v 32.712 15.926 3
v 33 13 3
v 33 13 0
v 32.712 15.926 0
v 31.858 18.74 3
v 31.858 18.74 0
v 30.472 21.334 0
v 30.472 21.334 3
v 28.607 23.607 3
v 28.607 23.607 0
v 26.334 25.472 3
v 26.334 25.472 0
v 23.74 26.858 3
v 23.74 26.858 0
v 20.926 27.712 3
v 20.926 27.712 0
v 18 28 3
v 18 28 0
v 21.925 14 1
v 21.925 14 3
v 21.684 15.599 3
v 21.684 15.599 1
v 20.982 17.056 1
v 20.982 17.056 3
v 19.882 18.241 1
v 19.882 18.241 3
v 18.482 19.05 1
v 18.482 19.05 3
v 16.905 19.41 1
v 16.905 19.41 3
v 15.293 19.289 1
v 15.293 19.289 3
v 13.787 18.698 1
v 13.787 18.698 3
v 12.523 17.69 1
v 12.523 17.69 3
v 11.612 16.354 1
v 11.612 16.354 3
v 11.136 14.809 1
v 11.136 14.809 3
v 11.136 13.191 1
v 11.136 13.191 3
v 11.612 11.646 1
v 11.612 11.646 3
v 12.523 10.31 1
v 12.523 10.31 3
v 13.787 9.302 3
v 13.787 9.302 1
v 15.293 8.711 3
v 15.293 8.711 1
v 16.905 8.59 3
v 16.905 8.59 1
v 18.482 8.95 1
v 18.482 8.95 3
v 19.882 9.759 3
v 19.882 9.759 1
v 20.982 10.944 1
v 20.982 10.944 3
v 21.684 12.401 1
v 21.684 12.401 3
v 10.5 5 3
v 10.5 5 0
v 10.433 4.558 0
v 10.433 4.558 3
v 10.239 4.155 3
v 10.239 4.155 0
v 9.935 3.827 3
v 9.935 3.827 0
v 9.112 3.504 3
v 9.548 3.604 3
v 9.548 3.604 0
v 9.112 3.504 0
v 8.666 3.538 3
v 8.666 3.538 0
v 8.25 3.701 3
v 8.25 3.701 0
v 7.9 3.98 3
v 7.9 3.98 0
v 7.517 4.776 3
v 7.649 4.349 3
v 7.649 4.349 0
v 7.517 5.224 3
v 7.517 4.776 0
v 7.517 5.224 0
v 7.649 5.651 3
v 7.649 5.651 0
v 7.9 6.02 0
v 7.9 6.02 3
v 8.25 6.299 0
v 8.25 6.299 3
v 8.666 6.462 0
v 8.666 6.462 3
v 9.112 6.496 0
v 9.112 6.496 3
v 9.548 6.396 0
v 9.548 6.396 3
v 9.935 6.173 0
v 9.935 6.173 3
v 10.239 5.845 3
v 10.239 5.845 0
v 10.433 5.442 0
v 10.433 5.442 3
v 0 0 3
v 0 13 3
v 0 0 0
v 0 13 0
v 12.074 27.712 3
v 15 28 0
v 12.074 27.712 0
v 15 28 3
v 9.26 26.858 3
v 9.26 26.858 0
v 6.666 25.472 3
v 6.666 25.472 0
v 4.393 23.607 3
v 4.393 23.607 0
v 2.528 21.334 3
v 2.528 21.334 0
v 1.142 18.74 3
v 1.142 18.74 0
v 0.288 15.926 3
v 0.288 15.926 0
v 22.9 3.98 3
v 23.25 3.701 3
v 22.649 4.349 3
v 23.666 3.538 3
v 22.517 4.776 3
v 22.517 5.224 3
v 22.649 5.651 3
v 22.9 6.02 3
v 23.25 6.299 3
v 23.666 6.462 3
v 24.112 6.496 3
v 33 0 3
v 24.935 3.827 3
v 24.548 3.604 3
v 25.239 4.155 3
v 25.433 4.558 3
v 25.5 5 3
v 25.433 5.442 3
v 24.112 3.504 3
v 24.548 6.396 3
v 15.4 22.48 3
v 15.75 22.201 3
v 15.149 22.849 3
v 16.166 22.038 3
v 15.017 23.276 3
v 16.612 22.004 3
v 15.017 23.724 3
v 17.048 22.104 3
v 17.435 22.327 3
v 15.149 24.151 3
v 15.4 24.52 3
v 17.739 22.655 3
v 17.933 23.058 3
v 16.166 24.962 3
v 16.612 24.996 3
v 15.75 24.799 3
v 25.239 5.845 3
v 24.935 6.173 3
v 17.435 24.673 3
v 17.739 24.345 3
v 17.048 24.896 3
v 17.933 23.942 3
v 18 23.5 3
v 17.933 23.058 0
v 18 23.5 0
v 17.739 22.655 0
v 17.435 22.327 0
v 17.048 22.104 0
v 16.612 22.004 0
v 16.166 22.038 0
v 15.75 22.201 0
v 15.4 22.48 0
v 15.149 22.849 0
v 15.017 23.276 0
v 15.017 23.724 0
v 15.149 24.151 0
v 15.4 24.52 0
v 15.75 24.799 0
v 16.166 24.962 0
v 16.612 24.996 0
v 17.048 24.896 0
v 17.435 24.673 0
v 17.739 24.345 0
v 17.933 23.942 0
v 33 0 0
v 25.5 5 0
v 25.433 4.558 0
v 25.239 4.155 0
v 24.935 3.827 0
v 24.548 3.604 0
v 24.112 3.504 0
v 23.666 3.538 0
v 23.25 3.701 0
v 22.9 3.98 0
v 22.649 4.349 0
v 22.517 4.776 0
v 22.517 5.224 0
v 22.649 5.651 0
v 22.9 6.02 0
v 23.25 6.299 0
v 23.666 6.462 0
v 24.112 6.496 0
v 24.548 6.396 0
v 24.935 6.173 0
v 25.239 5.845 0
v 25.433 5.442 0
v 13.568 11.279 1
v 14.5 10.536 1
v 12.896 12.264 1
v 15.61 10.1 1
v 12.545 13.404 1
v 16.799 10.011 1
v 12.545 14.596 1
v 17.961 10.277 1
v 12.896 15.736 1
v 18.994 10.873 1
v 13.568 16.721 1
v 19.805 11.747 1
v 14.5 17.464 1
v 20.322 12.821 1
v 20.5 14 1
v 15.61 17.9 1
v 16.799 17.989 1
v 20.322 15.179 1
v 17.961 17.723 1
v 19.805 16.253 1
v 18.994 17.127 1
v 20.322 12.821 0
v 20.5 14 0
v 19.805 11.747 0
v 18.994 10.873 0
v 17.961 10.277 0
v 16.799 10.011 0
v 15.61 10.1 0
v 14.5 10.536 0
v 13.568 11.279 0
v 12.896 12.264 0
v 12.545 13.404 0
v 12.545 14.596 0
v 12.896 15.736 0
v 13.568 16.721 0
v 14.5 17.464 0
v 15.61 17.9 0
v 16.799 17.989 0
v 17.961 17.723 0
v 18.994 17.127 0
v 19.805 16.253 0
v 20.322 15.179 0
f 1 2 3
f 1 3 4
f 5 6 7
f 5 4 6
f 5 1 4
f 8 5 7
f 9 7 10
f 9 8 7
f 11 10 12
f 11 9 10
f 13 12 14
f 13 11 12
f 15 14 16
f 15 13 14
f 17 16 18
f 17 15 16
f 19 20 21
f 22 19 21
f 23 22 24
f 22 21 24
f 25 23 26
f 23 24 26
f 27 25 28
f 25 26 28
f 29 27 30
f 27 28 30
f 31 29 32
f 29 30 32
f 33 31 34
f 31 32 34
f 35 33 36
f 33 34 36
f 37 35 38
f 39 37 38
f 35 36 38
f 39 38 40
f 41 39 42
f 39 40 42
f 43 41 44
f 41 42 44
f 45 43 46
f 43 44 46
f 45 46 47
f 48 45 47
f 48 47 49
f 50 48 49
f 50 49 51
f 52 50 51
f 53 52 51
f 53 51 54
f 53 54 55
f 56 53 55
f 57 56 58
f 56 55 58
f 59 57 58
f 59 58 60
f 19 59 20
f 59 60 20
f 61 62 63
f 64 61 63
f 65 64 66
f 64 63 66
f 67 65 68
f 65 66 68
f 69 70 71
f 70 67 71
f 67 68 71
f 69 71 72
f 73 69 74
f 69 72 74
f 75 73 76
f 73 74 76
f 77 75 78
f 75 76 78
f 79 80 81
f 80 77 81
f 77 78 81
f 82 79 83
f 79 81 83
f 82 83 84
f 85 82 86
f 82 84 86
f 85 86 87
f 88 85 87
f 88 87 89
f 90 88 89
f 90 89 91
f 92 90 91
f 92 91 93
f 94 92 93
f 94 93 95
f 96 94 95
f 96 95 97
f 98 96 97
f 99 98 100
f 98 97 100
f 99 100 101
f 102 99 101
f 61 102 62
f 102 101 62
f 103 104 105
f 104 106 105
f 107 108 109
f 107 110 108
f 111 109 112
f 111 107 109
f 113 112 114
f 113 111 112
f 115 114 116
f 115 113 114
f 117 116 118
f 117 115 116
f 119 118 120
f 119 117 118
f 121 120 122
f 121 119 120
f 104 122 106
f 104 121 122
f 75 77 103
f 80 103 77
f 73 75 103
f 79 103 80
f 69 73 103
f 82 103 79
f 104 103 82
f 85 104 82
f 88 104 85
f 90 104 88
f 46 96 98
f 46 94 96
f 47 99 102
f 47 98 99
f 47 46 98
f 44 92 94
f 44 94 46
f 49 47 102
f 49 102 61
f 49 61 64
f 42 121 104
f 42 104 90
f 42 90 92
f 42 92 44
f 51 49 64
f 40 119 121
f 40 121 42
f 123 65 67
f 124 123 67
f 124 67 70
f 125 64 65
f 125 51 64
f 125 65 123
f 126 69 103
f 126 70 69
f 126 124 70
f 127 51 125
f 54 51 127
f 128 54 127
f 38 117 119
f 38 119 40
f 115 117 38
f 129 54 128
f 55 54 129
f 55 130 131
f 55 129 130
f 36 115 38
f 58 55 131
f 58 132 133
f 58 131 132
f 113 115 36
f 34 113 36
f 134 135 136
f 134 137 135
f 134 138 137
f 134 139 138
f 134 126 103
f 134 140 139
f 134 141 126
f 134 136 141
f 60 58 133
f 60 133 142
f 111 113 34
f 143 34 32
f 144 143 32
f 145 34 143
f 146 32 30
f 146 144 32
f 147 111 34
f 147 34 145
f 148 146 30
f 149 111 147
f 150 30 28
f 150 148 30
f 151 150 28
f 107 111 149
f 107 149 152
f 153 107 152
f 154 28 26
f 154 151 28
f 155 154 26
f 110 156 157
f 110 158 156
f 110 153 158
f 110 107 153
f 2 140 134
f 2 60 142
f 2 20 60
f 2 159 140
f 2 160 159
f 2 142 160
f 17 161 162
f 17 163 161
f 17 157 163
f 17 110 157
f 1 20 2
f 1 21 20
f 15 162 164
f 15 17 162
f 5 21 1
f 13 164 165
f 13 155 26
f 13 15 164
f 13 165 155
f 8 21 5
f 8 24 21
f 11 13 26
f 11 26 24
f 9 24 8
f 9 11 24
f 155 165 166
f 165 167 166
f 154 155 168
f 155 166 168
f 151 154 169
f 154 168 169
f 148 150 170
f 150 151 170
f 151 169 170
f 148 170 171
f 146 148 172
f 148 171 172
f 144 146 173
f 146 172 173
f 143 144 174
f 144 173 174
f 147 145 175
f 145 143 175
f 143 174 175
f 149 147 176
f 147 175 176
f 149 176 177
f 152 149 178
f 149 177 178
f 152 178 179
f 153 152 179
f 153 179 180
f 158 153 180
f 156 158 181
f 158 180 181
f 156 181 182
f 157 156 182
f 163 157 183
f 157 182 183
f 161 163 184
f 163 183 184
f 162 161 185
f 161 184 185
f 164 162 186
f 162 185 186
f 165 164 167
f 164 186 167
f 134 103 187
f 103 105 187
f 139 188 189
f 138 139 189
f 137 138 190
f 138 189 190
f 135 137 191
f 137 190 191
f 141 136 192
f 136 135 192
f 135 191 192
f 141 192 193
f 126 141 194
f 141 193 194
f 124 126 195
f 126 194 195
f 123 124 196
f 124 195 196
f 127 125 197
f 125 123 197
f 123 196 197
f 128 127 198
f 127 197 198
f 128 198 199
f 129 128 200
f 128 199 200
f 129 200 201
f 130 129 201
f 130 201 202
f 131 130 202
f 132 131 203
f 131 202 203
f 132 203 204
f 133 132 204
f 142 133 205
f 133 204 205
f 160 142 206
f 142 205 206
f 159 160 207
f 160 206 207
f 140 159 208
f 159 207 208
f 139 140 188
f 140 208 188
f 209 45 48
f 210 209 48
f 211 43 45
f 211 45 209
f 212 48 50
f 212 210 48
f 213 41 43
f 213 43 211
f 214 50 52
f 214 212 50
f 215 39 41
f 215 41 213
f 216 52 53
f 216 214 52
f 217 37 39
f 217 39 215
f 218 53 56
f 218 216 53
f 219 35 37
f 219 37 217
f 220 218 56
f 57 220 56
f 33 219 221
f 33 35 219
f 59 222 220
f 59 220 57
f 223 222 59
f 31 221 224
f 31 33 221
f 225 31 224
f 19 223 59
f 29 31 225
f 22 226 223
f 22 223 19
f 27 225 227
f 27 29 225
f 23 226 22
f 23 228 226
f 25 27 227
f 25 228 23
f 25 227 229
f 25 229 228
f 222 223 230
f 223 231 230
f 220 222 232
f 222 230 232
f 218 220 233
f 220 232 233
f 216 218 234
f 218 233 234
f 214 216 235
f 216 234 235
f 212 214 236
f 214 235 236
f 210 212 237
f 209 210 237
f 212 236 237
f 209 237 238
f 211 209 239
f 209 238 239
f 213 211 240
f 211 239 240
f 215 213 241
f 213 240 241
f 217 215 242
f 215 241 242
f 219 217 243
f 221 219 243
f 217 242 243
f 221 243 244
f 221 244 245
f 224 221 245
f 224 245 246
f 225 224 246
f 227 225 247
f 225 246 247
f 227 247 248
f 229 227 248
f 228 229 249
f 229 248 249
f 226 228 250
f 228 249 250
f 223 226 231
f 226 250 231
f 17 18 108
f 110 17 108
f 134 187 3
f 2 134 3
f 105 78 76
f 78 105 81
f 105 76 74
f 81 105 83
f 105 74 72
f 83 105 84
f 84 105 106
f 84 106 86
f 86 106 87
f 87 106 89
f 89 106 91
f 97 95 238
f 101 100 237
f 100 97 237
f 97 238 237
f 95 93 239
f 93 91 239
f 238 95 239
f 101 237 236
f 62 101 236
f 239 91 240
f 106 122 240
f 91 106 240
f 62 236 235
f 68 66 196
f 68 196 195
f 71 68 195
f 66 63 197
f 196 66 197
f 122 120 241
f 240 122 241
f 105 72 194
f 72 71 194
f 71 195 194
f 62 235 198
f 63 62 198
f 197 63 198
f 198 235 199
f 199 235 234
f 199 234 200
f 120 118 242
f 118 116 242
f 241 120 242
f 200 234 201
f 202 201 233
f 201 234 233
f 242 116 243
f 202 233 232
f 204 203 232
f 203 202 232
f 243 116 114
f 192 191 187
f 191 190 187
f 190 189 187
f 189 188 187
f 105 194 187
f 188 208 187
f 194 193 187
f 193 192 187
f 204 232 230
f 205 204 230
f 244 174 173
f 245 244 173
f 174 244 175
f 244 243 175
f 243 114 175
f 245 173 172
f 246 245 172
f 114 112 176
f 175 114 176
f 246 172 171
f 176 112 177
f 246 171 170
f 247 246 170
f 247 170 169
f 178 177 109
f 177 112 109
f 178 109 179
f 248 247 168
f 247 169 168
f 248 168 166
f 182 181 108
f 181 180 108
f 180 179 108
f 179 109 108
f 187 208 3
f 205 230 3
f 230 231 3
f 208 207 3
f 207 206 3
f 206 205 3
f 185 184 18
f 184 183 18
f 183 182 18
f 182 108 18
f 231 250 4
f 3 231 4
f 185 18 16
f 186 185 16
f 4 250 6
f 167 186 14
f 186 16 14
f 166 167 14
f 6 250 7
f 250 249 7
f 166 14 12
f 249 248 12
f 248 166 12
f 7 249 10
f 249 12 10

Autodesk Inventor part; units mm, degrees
ref_plane "YZ Plane" through (0, 0, 0) normal (1, 0, 0) x (0, 1, 0)
ref_plane "XZ Plane" through (0, 0, 0) normal (0, 1, 0) x (-1, 0, 0)
ref_plane "XY Plane" through (0, 0, 0) normal (0, 0, 1) x (1, 0, 0)
sketch "Sketch1" plane through (0, 0, 0) normal (0, 0, 1) x (1, 0, 0)
  line L0 (0, 0) -> (33, 0)
  line L1 (33, 0) -> (33, 28)
  line L2 (33, 28) -> (0, 28)
  line L3 (0, 28) -> (0, 0)
  circle A0 centre (16.5, 14) radius 4
  circle A1 centre (16.5, 23.5) radius 1.5
  circle A2 centre (9, 5) radius 1.5
  circle A3 centre (24, 5) radius 1.5
  dimension "d0" = 33
  dimension "d1" = 28
  dimension "d2" = 8
  dimension "d3" = 14
  dimension "d4" = 16.5
  dimension "d5" = 3
  dimension "d6" = 3
  dimension "d7" = 3
  dimension "d8" = 4.5
  dimension "d9" = 0
  dimension "d10" = 15
  dimension "d11" = 5
  dimension "d12" = 9
  dimension "d13" = 5
extrude "Extrusion1" add sketch "Sketch1" along normal blind 3
sketch "Sketch2" plane through (0, 0, 3) normal (0, 0, 1) x (1, 0, 0)
  circle A0 centre (16.5, 14) radius 4 projected
  circle A1 centre (16.5, 14) radius 5.425
  point P0 (0, 0)
  dimension "d16" = 10.85
extrude "Extrusion2" cut sketch "Sketch2" against normal blind 2 contours A0 | A1
fillet "Fillet1" radius 15 2 edges at (33, 28, 1.5) (0, 28, 1.5)
sketch "Sketch3" plane through (0, 0, 3) normal (0, 0, 1) x (1, 0, 0)
  arc A0 (15, 28) -> (0, 13) centre (15, 13) ccw projected
  line L0 (0, 13) -> (0, 0) projected
  line L1 (0, 0) -> (33, 0) projected
  line L2 (33, 0) -> (33, 13) projected
  arc A1 (33, 13) -> (18, 28) centre (18, 13) ccw projected
  line L3 (18, 28) -> (15, 28) projected
  circle A2 centre (16.5, 14) radius 5.425 projected
  circle A3 centre (16.5, 23.5) radius 1.5 projected
  circle A4 centre (9, 5) radius 1.5 projected
  circle A5 centre (24, 5) radius 1.5 projected
equation "\"d3\" = 0.5 * d1"
equation "\"d4\" = 0.5 * d0"
properties part number "Arm6_3D" material "Aluminum 6061, Welded"
